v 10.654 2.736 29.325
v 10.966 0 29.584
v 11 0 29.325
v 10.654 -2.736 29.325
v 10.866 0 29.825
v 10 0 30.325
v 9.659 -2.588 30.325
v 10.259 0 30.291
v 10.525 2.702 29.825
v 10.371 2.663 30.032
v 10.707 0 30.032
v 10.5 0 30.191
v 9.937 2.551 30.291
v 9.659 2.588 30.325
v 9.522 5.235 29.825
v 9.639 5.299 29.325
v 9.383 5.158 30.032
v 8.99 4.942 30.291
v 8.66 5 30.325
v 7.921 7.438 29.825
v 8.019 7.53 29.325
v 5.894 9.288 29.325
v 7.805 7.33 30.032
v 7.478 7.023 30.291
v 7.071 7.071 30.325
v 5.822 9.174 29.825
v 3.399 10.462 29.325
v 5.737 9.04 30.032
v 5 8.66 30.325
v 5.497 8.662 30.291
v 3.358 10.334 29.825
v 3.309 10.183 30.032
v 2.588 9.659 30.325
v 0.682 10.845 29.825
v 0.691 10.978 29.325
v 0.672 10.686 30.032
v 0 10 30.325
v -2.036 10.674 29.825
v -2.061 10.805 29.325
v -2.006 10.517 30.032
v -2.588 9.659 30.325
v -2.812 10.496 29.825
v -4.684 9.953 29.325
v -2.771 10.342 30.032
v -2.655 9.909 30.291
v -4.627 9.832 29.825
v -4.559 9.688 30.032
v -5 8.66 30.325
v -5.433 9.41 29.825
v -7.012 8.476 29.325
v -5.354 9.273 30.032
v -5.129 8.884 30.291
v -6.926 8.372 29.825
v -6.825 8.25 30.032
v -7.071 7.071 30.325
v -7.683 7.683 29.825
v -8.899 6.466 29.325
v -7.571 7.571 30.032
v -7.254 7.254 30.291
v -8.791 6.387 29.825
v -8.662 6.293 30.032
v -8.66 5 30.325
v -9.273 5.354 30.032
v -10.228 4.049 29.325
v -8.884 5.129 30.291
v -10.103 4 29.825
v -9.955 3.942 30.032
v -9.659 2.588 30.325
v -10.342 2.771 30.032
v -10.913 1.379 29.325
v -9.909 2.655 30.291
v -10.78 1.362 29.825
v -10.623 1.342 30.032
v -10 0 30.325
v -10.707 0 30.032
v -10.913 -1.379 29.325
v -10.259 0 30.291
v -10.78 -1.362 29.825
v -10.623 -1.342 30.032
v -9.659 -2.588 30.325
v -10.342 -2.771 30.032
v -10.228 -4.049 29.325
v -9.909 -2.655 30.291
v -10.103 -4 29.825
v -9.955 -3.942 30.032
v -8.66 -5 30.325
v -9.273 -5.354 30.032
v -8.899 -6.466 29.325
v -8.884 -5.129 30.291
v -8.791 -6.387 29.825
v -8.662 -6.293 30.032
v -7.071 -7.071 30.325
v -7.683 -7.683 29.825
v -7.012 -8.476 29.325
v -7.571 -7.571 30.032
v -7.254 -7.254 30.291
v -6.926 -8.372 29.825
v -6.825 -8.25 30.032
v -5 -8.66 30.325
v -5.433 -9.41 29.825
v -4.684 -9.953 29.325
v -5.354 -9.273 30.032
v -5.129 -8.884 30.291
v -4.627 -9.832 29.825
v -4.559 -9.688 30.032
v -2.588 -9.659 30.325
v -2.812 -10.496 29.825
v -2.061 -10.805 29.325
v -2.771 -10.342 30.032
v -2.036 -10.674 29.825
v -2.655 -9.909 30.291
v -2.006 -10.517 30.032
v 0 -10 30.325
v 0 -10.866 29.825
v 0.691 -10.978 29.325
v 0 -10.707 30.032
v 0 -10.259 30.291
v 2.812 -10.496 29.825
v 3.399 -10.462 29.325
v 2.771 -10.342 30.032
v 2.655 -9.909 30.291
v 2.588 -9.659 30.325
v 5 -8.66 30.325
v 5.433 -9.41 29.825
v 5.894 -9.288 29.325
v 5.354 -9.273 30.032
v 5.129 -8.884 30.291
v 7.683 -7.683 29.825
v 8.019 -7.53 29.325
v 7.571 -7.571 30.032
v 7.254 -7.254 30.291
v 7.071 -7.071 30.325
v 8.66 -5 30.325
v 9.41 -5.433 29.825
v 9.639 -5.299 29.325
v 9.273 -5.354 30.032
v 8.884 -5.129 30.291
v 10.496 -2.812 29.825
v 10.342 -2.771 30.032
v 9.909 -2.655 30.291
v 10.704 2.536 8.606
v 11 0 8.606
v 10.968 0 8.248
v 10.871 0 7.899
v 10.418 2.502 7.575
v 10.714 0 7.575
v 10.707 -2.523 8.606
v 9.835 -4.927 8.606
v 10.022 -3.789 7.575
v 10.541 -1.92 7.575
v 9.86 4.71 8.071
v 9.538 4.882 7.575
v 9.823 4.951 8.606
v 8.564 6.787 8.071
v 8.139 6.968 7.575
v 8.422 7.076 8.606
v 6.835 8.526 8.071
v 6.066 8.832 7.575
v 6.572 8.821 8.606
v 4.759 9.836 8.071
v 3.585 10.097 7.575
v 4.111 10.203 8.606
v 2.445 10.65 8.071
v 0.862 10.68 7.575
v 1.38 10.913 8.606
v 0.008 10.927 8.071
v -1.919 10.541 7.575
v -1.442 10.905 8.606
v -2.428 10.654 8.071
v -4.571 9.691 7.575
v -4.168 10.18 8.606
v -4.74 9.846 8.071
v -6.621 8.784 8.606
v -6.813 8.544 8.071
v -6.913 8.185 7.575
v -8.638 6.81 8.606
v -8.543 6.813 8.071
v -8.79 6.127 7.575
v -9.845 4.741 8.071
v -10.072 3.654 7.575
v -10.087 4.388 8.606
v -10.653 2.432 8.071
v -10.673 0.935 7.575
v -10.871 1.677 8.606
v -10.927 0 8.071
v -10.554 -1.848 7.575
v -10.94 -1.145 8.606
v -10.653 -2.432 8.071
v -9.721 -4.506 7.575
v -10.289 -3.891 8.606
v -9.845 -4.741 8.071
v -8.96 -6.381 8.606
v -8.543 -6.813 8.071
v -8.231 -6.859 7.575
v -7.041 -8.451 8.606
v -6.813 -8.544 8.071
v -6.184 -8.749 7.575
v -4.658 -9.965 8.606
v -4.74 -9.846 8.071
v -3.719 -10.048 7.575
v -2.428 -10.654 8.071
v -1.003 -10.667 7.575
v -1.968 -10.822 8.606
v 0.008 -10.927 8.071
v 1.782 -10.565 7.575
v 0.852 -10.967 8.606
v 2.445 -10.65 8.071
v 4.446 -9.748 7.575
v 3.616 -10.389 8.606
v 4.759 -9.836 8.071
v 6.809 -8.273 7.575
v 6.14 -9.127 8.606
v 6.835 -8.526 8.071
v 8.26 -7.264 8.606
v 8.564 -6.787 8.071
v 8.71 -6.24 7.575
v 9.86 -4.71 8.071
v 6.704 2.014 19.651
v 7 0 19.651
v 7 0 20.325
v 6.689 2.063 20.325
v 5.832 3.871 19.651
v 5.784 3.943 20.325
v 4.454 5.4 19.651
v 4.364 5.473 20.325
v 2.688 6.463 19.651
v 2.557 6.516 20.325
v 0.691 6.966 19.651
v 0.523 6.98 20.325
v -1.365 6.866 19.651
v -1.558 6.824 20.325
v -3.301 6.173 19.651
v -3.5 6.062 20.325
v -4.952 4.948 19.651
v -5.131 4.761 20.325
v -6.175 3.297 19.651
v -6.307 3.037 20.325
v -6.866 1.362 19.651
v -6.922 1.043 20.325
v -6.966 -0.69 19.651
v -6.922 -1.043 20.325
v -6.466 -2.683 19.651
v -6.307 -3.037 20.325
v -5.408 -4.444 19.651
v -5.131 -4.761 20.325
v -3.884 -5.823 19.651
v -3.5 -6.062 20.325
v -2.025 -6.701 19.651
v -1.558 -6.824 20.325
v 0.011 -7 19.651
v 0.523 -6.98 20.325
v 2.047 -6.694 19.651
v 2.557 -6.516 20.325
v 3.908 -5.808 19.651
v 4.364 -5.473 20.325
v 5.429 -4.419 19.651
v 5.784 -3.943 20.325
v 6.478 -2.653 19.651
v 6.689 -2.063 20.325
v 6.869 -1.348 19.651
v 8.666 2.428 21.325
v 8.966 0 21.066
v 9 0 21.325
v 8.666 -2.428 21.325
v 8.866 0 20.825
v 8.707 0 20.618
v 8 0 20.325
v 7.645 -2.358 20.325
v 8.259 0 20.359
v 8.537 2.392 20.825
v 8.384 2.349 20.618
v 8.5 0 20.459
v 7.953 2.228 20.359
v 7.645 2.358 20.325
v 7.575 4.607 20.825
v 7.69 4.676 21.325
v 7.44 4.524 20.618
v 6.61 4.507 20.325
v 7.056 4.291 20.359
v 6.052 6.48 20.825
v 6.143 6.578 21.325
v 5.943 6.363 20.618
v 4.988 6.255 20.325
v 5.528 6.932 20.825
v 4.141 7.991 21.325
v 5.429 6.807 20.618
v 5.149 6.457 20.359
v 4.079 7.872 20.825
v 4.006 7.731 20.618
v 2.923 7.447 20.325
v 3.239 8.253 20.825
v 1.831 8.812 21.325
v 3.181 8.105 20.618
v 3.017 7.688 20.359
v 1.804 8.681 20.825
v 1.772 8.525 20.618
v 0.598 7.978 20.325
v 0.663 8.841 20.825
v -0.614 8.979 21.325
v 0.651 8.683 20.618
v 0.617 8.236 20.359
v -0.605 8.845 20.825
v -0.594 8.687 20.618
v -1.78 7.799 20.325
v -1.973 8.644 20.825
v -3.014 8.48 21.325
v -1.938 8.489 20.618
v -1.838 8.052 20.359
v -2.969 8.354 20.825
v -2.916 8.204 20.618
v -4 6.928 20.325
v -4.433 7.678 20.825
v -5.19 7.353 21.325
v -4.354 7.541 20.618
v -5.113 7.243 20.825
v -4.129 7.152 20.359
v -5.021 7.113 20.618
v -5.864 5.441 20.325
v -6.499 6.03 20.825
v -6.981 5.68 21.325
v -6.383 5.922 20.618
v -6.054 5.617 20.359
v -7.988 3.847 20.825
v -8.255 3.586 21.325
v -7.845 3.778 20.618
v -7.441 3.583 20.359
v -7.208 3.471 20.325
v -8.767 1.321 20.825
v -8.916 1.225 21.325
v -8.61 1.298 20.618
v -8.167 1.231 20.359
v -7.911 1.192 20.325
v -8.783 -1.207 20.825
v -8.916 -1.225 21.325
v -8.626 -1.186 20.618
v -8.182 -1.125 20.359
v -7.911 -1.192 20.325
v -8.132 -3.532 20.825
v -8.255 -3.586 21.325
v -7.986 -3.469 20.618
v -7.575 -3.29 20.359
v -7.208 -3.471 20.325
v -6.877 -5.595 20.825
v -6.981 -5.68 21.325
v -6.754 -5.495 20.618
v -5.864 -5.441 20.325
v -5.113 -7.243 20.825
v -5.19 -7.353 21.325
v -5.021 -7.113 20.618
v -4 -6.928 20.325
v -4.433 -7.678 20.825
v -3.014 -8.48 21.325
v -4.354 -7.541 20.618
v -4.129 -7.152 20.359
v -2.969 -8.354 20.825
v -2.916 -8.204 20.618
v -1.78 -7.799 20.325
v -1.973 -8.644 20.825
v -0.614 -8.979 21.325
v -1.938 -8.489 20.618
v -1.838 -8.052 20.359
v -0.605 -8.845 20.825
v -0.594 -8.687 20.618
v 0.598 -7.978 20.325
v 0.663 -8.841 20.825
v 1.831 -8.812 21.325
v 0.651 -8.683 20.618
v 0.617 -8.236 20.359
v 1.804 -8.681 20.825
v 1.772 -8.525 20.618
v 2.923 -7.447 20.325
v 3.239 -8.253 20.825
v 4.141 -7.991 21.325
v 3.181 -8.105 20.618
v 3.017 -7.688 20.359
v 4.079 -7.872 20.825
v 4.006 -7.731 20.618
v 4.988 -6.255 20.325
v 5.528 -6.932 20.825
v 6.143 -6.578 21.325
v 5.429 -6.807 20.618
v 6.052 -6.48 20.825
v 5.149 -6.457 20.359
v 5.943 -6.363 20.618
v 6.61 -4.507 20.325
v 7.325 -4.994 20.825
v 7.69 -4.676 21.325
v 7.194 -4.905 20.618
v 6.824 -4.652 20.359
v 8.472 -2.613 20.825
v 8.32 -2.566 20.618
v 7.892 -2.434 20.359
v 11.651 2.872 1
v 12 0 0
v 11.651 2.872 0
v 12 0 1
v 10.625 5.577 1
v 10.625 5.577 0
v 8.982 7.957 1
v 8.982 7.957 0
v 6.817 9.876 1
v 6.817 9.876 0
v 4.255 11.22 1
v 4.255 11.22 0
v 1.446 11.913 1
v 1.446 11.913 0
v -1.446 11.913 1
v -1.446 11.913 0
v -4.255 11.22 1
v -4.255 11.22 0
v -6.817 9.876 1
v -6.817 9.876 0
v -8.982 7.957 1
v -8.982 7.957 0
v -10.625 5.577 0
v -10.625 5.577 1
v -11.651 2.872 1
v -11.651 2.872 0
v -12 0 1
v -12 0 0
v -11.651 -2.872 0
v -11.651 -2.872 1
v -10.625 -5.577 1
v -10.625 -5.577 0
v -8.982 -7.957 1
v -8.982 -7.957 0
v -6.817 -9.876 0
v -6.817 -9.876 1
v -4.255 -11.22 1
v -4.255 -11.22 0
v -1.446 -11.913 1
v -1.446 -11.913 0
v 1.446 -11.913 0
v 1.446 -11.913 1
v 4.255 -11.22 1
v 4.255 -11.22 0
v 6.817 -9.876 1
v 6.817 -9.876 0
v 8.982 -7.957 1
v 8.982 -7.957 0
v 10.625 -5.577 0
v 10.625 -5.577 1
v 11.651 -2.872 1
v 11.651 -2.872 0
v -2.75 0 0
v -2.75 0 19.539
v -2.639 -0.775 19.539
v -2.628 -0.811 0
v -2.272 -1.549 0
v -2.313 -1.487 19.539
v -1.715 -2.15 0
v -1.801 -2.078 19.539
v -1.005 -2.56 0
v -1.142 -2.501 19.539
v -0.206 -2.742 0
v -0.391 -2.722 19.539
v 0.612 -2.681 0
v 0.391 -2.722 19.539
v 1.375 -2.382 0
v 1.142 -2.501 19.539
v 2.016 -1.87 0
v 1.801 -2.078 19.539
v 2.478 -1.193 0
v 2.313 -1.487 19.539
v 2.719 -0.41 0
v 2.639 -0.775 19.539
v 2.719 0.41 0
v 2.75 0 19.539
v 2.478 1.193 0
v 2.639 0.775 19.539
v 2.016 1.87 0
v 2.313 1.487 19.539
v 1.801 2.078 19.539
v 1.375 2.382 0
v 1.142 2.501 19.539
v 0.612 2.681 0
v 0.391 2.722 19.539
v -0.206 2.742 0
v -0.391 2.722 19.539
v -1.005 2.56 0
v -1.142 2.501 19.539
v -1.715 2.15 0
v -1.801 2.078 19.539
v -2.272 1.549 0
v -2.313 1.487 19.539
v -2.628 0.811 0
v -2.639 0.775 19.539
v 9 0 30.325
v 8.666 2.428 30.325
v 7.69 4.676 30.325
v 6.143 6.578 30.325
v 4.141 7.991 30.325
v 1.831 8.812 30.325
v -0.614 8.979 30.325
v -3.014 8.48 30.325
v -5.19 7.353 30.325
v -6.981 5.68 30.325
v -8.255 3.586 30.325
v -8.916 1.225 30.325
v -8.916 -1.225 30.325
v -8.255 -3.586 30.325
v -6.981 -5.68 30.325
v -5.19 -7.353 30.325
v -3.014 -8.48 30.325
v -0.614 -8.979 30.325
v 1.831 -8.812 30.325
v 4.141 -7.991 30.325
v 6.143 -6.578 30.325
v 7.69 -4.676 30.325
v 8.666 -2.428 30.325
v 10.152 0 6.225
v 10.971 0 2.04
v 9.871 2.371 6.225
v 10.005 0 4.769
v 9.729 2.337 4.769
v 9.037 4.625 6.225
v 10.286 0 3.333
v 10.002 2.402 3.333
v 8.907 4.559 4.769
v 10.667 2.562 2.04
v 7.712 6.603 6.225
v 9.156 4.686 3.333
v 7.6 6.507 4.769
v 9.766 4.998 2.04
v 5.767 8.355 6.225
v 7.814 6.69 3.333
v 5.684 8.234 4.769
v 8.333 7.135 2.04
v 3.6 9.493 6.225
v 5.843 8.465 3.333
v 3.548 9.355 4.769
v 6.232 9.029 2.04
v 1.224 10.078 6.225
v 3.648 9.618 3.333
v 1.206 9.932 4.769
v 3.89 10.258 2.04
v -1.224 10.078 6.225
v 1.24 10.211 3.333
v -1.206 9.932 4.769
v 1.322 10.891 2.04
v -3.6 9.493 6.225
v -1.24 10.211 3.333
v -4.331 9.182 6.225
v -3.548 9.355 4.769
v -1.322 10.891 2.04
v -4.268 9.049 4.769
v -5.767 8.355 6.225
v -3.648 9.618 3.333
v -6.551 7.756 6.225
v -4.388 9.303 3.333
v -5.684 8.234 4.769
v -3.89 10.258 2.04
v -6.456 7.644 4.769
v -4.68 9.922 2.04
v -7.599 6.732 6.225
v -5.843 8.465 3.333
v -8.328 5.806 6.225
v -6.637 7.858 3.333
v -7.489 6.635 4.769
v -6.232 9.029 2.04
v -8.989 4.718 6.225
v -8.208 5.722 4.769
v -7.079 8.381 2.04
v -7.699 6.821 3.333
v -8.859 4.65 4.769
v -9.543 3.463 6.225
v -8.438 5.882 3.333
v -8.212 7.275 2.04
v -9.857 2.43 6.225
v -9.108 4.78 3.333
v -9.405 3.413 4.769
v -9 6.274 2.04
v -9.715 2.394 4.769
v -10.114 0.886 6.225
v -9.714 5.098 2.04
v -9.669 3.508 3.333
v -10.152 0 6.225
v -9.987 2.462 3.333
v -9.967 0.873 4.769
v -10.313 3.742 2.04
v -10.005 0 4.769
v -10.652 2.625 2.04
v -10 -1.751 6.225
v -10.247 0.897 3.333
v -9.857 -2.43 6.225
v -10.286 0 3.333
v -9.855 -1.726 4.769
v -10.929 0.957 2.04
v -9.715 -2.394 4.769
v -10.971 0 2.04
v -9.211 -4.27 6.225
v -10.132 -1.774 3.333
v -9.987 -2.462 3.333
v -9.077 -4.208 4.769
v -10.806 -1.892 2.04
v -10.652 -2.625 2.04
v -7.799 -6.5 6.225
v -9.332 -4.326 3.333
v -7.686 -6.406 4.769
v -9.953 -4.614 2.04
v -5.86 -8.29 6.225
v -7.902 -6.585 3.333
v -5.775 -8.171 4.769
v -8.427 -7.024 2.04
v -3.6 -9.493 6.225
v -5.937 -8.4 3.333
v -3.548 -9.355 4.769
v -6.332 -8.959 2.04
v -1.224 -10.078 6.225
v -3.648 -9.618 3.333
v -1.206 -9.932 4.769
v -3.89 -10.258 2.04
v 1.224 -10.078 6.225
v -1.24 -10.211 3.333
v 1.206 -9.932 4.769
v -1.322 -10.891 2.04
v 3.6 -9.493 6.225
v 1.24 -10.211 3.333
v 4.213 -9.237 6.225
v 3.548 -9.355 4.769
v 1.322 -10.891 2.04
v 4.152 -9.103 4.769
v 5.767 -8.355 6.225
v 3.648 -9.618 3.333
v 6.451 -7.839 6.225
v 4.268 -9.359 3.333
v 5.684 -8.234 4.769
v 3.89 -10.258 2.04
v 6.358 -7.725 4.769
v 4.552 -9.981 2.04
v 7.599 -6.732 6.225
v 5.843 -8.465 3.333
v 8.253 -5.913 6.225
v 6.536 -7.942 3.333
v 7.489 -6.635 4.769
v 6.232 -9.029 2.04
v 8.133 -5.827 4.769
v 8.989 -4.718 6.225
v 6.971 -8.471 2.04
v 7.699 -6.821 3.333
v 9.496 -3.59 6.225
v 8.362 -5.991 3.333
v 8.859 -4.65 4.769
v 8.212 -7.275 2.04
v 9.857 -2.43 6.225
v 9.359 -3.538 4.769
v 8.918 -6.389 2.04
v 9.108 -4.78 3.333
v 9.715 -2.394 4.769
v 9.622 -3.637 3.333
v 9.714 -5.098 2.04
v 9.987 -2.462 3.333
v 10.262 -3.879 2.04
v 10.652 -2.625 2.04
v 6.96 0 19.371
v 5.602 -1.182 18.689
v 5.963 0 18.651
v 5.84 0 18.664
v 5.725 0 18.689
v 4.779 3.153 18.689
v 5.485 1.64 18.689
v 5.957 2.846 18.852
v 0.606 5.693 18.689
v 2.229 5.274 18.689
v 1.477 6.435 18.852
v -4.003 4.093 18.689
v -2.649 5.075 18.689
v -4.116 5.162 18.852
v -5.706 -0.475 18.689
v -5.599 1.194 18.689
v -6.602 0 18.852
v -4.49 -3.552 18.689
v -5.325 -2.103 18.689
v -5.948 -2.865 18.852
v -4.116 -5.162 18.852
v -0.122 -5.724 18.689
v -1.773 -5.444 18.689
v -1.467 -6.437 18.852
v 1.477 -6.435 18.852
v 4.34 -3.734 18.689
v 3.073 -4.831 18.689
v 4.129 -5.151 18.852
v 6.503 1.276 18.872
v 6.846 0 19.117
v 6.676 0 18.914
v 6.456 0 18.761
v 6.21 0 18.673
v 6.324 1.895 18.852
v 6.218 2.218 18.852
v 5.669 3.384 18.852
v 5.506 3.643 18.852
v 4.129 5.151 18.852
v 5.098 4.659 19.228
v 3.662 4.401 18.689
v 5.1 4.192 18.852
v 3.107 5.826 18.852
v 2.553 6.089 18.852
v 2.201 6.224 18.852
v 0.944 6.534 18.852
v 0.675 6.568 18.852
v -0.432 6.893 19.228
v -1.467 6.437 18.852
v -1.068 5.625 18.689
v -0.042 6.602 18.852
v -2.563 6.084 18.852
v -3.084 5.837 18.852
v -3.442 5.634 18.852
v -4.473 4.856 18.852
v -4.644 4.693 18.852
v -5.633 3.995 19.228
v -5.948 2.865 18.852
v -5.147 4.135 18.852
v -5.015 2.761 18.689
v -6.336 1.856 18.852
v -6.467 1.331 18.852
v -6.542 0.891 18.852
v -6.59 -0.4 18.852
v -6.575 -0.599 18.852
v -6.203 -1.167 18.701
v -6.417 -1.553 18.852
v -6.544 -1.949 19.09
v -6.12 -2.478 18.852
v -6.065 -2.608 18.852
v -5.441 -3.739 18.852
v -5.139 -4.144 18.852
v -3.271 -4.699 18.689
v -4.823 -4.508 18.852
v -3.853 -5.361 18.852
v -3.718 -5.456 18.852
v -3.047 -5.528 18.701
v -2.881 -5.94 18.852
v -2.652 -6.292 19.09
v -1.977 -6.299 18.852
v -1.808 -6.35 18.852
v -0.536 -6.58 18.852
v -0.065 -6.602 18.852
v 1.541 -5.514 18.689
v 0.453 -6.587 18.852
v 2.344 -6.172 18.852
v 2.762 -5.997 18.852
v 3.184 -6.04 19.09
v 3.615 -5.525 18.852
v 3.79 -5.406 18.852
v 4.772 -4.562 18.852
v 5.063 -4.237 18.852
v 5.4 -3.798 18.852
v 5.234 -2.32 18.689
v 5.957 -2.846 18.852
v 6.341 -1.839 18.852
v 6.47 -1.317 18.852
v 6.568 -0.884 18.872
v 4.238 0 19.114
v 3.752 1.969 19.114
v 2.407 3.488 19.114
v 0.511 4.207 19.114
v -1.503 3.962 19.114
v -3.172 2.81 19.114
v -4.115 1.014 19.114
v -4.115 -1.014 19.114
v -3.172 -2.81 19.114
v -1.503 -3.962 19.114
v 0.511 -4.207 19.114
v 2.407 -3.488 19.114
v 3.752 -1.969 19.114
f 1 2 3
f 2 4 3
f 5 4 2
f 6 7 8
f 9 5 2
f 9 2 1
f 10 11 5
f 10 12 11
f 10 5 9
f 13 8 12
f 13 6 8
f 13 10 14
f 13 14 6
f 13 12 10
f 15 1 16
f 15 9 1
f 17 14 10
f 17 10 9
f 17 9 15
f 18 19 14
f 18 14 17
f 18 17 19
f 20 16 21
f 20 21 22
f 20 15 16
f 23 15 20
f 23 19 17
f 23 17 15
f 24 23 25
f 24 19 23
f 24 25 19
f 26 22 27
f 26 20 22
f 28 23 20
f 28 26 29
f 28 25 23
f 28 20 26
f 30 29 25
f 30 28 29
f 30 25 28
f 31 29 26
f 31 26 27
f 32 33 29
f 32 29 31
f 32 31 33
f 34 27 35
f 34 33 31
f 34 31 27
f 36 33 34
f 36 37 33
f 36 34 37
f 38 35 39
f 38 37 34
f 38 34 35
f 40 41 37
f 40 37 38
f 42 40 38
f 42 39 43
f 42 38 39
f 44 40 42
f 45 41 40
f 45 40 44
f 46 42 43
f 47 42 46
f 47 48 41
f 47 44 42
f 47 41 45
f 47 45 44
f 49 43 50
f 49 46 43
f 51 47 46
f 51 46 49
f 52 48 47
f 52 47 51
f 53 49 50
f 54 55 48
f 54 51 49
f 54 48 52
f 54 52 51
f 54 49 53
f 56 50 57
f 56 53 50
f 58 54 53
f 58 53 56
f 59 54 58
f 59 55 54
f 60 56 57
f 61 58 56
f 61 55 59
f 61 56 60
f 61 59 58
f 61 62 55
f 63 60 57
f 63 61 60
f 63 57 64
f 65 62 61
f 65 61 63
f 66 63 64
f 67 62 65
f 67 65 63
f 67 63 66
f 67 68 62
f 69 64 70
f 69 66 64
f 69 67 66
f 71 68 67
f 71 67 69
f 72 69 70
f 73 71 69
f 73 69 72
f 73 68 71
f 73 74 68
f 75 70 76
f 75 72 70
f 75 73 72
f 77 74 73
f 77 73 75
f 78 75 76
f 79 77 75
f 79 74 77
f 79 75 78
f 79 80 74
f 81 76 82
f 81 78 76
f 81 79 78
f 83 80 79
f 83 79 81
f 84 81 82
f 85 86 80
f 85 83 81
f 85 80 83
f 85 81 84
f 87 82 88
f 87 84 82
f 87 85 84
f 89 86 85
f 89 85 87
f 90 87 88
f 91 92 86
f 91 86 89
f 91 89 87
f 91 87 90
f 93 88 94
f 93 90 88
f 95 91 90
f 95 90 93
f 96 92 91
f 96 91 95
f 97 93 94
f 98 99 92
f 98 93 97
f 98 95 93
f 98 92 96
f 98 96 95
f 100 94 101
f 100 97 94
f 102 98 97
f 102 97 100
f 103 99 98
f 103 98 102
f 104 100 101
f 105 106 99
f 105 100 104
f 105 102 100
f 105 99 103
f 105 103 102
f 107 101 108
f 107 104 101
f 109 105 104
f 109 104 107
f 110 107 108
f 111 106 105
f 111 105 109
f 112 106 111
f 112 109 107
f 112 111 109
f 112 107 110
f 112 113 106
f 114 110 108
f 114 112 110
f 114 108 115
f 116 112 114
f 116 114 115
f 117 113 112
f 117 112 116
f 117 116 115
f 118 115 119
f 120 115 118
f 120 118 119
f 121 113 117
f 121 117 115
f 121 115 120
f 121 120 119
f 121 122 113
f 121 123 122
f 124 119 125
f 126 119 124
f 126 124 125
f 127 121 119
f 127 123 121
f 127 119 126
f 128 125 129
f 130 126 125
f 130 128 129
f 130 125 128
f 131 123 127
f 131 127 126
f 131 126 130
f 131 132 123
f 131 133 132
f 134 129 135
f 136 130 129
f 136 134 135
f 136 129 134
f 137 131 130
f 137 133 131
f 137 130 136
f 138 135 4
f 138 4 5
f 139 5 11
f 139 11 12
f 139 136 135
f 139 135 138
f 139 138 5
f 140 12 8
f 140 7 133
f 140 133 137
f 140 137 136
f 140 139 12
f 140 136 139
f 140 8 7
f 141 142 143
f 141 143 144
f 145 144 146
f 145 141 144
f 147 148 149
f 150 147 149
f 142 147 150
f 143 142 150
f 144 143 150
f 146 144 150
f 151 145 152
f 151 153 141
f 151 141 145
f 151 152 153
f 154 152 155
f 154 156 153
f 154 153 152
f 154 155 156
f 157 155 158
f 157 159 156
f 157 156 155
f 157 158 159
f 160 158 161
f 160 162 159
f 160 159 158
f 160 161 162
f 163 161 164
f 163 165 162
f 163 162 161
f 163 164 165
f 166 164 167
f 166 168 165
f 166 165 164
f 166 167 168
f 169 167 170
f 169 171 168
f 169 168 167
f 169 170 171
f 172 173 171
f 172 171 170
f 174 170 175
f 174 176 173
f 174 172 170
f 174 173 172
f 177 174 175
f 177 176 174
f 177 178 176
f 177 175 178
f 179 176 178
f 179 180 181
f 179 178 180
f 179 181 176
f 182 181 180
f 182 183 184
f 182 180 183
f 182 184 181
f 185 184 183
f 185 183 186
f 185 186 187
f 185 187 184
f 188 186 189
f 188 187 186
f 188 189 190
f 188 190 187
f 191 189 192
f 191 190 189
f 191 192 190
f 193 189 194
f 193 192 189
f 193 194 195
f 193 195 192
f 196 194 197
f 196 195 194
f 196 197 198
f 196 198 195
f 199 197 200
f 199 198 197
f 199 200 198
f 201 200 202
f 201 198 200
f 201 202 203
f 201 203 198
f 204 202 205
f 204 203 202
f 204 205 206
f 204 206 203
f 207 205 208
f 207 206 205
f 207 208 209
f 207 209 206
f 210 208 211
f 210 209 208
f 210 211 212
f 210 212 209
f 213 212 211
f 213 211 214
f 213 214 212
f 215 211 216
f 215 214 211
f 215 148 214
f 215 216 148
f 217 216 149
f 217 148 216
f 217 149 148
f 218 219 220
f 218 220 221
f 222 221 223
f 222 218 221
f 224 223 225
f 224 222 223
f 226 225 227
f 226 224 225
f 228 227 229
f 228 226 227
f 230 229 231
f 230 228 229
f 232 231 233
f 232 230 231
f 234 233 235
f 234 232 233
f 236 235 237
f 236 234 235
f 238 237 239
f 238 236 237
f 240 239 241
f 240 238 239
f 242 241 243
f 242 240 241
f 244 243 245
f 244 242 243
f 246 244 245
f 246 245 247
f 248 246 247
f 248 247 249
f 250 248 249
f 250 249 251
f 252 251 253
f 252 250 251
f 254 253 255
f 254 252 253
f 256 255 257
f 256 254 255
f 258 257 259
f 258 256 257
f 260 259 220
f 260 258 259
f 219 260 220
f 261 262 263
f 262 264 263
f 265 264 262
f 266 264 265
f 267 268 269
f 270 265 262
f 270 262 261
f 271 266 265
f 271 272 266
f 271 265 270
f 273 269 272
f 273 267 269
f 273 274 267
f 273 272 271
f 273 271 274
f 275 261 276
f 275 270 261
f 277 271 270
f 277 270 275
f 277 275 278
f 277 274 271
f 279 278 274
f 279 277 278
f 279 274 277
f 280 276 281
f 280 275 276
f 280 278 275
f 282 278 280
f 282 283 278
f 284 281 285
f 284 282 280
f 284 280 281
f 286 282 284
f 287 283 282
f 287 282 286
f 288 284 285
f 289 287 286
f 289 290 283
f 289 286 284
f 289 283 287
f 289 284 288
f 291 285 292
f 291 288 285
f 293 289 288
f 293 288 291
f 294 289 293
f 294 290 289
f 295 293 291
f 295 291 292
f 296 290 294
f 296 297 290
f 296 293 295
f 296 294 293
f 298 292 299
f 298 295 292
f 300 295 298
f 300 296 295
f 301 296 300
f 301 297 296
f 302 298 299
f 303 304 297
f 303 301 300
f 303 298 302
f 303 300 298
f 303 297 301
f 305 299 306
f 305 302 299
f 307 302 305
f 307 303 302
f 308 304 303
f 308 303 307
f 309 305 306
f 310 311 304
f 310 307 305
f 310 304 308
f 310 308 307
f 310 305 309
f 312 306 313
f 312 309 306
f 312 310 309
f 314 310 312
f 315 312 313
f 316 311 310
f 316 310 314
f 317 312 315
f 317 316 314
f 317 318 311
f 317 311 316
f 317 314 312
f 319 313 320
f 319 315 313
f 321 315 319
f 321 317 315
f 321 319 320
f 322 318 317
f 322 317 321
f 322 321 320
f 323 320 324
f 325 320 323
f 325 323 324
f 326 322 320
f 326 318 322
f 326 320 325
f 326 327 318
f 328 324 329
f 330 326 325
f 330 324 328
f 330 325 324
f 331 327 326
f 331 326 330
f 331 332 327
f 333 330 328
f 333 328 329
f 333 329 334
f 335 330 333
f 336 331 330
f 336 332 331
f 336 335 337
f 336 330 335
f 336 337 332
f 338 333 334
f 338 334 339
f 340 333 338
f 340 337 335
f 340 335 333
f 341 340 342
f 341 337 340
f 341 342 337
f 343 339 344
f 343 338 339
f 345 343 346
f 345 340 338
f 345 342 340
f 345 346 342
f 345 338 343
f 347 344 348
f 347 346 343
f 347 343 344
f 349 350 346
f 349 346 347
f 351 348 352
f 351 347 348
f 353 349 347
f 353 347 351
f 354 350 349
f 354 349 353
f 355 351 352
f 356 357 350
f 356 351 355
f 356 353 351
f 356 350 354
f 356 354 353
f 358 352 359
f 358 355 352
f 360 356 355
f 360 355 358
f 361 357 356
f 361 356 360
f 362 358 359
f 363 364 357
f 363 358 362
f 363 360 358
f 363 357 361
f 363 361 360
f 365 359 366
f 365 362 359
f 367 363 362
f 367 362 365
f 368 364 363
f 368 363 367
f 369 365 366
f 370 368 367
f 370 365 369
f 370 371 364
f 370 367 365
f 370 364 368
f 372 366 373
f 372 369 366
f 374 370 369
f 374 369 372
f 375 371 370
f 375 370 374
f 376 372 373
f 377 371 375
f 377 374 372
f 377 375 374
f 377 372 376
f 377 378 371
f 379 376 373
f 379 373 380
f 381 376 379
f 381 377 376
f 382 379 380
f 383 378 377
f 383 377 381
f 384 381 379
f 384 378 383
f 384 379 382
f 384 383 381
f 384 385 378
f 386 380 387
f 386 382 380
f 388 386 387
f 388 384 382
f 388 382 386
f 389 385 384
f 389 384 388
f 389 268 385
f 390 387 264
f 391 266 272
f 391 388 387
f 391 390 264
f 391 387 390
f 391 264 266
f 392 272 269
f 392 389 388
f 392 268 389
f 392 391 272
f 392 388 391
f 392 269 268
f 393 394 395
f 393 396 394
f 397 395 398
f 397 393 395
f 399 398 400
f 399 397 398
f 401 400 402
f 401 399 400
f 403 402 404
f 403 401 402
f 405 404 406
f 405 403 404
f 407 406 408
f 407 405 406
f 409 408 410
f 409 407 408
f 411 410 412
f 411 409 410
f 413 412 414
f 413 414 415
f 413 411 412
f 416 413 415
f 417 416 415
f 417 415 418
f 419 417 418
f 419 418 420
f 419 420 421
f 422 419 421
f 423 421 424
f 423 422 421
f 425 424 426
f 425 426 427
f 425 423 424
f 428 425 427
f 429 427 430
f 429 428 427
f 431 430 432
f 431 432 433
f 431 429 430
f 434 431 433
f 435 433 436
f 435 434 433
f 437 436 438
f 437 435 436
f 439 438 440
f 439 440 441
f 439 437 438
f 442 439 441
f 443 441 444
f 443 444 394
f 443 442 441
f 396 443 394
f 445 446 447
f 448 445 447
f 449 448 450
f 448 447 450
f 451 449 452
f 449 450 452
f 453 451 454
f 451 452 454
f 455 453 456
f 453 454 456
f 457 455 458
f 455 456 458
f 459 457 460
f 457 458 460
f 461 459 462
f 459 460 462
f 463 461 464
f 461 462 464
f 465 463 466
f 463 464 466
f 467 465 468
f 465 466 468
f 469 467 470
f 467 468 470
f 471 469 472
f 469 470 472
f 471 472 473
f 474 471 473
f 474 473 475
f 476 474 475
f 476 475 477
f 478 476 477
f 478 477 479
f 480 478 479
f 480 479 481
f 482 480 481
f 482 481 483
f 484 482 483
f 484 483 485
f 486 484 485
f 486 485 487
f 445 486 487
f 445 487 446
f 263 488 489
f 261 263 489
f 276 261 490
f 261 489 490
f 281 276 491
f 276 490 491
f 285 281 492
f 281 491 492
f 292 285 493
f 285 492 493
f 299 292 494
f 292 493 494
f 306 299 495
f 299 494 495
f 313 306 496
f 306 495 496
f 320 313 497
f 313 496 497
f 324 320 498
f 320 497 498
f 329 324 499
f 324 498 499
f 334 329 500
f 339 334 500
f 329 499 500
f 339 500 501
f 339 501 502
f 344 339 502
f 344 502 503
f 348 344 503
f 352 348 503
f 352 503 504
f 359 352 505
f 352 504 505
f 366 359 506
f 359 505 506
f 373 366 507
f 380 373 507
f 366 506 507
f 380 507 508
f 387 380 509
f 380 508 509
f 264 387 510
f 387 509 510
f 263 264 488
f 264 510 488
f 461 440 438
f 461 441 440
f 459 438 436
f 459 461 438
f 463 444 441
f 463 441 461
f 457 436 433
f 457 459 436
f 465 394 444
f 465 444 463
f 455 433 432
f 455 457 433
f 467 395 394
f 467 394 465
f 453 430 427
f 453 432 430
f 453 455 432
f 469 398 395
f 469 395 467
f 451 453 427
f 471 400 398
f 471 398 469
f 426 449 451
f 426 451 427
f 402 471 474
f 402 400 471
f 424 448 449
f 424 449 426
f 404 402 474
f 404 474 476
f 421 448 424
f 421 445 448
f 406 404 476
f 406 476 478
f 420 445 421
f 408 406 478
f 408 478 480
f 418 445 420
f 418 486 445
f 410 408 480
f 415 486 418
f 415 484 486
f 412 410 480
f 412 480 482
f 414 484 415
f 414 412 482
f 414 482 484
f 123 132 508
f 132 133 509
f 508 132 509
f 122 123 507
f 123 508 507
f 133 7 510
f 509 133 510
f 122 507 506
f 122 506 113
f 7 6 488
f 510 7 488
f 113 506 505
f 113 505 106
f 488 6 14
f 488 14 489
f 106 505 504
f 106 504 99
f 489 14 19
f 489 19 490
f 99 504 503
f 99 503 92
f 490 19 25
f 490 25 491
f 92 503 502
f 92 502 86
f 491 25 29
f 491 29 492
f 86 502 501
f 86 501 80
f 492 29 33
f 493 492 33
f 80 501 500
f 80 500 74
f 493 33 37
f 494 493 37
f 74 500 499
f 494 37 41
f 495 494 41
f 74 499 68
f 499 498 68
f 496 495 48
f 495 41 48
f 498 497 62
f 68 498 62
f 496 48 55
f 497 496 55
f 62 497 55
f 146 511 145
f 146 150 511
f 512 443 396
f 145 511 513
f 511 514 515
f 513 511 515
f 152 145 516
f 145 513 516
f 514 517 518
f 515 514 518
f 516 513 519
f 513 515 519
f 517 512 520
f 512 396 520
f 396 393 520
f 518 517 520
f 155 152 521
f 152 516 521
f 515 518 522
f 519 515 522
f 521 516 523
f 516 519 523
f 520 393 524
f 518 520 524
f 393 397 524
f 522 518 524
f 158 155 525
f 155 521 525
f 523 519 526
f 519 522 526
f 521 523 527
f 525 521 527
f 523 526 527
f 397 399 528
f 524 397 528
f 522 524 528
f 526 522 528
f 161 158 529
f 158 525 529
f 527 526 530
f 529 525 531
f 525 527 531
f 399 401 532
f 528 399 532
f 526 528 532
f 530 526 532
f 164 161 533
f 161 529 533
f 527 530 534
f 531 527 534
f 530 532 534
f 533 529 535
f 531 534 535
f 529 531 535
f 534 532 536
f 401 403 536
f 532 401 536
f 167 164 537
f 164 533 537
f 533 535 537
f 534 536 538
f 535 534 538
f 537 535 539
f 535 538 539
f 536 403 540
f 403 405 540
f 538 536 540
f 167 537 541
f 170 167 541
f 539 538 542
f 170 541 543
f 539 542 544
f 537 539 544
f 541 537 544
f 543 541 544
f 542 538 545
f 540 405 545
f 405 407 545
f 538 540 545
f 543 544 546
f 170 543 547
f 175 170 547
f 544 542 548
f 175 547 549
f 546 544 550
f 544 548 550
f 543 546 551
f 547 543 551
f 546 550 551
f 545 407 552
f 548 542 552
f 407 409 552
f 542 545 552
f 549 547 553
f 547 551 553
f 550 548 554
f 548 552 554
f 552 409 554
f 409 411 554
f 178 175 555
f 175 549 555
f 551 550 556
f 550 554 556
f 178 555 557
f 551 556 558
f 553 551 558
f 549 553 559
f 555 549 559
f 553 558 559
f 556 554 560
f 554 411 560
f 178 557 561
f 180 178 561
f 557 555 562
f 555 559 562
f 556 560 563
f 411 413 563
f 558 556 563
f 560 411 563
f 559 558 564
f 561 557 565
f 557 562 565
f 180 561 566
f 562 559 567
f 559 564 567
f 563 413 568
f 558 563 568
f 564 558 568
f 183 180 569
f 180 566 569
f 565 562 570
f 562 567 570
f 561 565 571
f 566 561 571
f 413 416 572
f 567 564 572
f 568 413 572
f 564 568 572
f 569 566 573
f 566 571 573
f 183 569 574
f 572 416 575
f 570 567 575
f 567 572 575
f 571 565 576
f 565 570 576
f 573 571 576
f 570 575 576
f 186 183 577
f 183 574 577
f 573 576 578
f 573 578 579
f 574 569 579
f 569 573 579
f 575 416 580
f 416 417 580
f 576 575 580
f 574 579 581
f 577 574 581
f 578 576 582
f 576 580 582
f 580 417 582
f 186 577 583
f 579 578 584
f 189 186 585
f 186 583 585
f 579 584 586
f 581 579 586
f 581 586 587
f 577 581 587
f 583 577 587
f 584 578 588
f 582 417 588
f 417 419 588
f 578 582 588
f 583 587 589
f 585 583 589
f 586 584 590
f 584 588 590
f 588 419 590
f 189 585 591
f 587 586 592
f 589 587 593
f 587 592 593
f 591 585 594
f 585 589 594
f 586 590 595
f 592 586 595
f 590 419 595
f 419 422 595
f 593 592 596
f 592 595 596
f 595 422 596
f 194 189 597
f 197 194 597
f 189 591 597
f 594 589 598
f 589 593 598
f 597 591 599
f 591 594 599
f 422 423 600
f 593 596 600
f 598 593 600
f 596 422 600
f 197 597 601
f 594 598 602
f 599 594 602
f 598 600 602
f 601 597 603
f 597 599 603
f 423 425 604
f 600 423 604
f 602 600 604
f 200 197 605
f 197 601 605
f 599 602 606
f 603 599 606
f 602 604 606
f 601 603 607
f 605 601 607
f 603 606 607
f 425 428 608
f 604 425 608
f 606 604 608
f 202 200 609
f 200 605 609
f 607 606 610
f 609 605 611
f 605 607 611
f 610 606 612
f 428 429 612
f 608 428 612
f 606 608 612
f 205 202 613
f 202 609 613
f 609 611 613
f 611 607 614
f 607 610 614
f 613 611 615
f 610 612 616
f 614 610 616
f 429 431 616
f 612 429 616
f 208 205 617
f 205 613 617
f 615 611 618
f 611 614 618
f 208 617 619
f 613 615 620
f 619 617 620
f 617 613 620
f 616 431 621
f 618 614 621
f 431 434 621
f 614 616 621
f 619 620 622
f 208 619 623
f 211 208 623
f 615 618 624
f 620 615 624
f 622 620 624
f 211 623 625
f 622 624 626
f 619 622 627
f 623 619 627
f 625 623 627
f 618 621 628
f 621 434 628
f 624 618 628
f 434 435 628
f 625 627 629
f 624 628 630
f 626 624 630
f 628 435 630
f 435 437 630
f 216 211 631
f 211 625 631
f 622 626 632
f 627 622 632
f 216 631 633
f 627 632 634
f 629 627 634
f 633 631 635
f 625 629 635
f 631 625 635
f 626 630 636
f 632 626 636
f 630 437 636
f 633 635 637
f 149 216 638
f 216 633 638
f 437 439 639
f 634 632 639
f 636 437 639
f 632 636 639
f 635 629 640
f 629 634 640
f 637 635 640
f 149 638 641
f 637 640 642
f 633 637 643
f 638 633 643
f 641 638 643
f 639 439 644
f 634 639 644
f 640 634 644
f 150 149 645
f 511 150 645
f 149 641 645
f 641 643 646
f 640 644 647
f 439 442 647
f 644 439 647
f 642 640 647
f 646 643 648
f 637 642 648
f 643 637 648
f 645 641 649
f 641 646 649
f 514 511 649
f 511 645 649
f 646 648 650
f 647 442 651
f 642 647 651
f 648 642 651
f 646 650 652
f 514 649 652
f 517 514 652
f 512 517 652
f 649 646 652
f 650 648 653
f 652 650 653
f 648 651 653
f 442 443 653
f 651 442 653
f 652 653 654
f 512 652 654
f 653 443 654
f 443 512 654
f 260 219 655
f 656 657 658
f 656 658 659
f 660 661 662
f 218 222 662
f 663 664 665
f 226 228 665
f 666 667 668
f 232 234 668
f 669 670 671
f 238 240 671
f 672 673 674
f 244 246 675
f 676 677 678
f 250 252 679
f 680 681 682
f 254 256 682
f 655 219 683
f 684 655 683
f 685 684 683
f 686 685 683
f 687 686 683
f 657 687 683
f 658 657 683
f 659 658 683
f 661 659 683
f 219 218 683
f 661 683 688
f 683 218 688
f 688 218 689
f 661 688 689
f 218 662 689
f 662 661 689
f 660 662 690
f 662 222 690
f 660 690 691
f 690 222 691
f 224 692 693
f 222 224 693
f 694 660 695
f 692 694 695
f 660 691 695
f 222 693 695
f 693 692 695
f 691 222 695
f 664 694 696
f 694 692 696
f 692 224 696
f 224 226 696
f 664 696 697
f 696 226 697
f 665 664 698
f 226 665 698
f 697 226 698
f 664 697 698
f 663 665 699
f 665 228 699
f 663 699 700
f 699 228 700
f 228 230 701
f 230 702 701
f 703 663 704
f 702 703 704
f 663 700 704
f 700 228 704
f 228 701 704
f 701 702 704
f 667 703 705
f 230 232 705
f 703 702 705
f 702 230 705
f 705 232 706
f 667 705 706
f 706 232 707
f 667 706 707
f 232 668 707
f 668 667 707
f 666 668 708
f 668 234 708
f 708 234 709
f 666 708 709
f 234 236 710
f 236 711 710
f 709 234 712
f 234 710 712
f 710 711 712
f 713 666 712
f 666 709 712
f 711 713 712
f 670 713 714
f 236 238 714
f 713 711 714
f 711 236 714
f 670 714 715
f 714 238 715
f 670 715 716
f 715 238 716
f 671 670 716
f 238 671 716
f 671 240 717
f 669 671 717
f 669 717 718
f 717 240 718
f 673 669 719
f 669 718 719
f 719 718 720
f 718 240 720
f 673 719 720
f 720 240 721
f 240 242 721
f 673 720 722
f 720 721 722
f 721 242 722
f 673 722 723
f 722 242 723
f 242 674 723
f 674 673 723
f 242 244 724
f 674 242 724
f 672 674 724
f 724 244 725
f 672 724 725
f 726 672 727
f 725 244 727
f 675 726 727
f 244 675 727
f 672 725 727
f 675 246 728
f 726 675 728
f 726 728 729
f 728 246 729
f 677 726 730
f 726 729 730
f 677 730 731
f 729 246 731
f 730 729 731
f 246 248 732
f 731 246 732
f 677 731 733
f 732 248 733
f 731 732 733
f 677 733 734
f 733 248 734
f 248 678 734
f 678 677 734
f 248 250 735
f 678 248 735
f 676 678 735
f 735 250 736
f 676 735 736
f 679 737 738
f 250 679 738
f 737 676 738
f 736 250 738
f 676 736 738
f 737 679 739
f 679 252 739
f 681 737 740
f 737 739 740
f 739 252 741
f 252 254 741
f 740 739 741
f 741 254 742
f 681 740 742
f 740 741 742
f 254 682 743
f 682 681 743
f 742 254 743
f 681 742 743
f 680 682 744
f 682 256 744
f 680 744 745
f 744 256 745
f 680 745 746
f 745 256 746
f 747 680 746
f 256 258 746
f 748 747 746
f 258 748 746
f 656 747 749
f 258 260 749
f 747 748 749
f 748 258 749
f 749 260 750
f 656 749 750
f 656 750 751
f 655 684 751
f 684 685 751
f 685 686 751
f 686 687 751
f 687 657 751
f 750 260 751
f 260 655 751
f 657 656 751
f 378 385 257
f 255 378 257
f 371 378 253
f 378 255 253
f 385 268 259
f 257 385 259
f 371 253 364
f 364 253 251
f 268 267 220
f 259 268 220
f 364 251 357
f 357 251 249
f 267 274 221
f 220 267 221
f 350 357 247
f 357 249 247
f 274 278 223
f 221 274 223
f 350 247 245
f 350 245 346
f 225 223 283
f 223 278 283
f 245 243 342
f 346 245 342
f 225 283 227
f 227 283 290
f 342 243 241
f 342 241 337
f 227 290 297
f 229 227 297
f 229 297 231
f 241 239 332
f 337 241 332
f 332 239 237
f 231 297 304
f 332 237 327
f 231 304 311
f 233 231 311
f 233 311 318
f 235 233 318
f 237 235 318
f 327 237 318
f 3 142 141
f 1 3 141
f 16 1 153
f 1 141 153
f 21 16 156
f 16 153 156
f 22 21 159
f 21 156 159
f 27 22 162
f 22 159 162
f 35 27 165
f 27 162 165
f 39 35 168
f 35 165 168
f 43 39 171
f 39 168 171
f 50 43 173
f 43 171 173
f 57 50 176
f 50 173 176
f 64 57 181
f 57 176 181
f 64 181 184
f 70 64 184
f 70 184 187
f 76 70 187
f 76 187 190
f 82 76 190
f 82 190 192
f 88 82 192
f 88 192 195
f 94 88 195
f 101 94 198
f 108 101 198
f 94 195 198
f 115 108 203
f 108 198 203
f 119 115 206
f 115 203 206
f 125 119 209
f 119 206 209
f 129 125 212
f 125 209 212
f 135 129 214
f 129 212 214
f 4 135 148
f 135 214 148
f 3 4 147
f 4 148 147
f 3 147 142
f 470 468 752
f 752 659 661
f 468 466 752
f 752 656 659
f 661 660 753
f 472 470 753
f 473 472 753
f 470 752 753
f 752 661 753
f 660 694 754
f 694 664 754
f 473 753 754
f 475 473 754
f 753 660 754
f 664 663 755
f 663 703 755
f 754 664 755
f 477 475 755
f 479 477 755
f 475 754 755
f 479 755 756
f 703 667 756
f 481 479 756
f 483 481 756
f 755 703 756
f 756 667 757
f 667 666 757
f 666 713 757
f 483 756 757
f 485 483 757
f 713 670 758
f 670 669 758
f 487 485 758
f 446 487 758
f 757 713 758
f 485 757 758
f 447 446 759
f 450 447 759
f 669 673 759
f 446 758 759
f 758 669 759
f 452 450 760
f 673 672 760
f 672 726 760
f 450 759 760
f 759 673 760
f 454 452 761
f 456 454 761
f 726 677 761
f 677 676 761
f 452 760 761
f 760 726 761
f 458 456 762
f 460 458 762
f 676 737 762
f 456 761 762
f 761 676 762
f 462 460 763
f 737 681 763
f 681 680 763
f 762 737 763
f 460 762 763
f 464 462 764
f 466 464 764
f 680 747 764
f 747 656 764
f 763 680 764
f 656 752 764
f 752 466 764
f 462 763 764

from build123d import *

# Parameters (mm, degrees)
FILLET001_R  = 1
SKETCH010_R  = 2.75
POCKET_DEPTH = 30.326
FILLET002_R  = 2


with BuildPart() as part:
    # Sketch → Revolution (revolve)
    with BuildSketch(Plane.XZ):
        with BuildLine():
            Line((0, 0), (12, 0))
            Line((12, 0), (12, 1))
            ThreePointArc((11, 8), (10.050253, 4.292893), (12, 1))
            Line((11, 30.325), (11, 8))
            Line((9, 30.325), (11, 30.325))
            Line((9, 20.325), (9, 30.325))
            Line((7, 20.325), (9, 20.325))
            Line((7, 20.325), (7, 18.325))
            Line((0, 20.325), (7, 18.325))
            Line((0, 0), (0, 20.325))
        make_face()
    revolve(axis=Axis((0, 0, 0), (0, 0, 1)))

    # Fillet001
    fillet001_edges = [part.edges().sort_by_distance(p)[0] for p in [
        (-11, 0, 30.325),
        (-7, 0, 18.325),
        (-9, 0, 20.325),
    ]]
    fillet(fillet001_edges, radius=FILLET001_R)

    # Sketch010 (on Face4 of Fillet001) → Pocket (cut, through all)
    with BuildSketch(Plane(origin=(0, 0, 30.325), x_dir=(-1, 0, 0), z_dir=(0, 0, 1))):
        Circle(SKETCH010_R)
    extrude(amount=-POCKET_DEPTH, mode=Mode.SUBTRACT)

    # Fillet002
    fillet002_edges = [part.edges().sort_by_distance(p)[0] for p in [
        (-11, 0, 8),
    ]]
    fillet(fillet002_edges, radius=FILLET002_R)


solid = part.part
